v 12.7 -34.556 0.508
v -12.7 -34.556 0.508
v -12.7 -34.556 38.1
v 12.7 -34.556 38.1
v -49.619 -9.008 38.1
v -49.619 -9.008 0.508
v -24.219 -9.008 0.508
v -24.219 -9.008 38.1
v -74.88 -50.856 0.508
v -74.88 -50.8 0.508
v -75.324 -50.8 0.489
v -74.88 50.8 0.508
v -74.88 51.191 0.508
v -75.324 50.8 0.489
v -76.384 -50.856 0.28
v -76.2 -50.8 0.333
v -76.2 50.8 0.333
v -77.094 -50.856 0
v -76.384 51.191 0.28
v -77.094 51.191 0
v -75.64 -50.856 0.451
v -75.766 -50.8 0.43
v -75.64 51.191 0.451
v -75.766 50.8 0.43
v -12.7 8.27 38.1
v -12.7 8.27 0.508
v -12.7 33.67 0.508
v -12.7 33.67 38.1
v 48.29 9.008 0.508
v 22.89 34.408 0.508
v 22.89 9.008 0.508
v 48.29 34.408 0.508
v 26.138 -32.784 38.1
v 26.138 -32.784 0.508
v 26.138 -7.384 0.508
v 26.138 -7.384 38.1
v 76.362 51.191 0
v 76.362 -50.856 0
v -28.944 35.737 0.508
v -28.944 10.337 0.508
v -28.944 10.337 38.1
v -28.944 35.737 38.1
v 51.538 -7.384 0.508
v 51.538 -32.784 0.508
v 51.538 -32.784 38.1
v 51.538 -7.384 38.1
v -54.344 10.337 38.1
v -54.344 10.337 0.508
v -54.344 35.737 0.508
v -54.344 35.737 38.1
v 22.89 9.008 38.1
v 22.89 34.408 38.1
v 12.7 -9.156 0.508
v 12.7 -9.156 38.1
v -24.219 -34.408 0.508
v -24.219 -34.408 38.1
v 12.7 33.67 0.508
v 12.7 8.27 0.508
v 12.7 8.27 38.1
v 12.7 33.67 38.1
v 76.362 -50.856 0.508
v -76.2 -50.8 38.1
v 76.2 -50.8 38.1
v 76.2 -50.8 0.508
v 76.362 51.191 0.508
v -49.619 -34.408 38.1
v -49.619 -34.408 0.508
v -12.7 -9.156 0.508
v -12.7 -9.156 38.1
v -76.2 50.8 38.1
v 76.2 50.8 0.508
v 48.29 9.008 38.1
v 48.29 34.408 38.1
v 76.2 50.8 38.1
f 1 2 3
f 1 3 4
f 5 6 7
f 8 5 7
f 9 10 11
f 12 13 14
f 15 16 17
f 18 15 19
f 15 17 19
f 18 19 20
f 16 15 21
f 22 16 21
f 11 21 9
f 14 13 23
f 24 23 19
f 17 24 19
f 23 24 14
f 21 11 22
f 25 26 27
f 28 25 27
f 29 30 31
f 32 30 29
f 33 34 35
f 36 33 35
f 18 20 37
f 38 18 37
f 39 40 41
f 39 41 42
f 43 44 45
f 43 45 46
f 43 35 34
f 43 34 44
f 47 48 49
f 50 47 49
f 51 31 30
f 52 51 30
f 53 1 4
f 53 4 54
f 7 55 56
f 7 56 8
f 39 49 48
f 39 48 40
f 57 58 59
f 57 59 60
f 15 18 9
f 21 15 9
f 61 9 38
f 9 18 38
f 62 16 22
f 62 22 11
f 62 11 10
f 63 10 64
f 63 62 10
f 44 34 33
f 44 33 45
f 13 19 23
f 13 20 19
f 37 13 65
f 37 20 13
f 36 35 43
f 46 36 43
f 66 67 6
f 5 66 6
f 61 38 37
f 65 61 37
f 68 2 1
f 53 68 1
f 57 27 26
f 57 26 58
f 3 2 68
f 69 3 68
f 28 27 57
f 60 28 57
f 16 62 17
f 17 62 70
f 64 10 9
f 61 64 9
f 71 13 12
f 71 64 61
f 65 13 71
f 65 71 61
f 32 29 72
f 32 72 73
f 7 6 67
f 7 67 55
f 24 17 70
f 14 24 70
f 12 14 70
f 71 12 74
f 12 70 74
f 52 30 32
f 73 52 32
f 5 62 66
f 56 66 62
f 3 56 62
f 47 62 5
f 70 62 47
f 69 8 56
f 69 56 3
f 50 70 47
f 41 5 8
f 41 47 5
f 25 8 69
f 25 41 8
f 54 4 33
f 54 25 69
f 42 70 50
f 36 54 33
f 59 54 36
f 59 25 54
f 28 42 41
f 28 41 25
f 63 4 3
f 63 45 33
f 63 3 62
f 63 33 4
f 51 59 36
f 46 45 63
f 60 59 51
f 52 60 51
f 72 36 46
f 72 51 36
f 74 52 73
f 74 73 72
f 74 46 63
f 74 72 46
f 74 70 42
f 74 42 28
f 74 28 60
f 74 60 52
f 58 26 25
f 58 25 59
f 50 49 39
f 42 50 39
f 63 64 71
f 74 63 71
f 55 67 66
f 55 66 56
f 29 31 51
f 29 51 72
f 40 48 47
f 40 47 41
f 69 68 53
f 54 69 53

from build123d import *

# Parameters (mm, degrees)
F1_W         = 152.4
F1_H         = 101.6
F1_W_2       = 25.4
F1_H_2       = 25.4
F2_DEPTH     = 38.1
F3_W         = 153.4559056163
F3_H         = 102.0477414131
F3_W_2       = 152.4
F3_H_2       = 101.6
F4_DEPTH     = 0.508
F0_W         = 152.4
F0_H         = 101.6
F5_DEPTH     = 0.508
F6_T4_DEPTH  = 113.1193447297
F6_T9_DEPTH  = 113.1193447297
F6_T14_DEPTH = 113.1193447297


# Not quite as in the source:
# - a fillet or chamfer that OpenCascade refuses, or shapes differently, is made with other operations: its cross-section is extruded or revolved along the edge and cut away or added


with BuildPart() as f2:
    # F1 (on face) → F2 (new body)
    with BuildSketch(Plane.XY):
        Rectangle(F1_W, F1_H)
        with Locations((-36.918597445, -21.7081383014)):
            Rectangle(F1_W_2, F1_H_2, mode=Mode.SUBTRACT)
        with Locations((0, -21.855811876)):
            Rectangle(F1_W_2, F1_H_2, mode=Mode.SUBTRACT)
        with Locations((38.8383678732, -20.0837206056)):
            Rectangle(F1_W_2, F1_H_2, mode=Mode.SUBTRACT)
        with Locations((-41.6441853324, 23.0372088479)):
            Rectangle(F1_W_2, F1_H_2, mode=Mode.SUBTRACT)
        with Locations((0, 20.9697662408)):
            Rectangle(F1_W_2, F1_H_2, mode=Mode.SUBTRACT)
        with Locations((35.5895380648, 21.7081389993)):
            Rectangle(F1_W_2, F1_H_2, mode=Mode.SUBTRACT)
    extrude(amount=F2_DEPTH)

    # F3 (on face) → F4 (join)
    with BuildSketch(Plane.XY):
        with Locations((-0.3659911454, 0.1675821841)):
            Rectangle(F3_W, F3_H)
        Rectangle(F3_W_2, F3_H_2, mode=Mode.SUBTRACT)
    extrude(amount=F4_DEPTH)

    # F0 (on Top) → F5 (join)
    with BuildSketch(Plane.XY):
        Rectangle(F0_W, F0_H)
    extrude(amount=F5_DEPTH)

    # F6: fillet of radius 5.08 on 1 edges, made by hand


with BuildPart() as f6_tool2:
    # F6_s3 → F6_t4 (new body)
    with BuildSketch(Plane.XZ.offset(-56.7272545489)):
        with BuildLine():
            ThreePointArc((-74.8796232902, 0.508), (-76.0155458228, 0.3793715272), (-77.0939439535, 0))
            Line((-77.0939439535, 0), (-77.0939439535, 0.508))
            Line((-77.0939439535, 0.508), (-74.8796232902, 0.508))
        make_face()
    extrude(amount=F6_T4_DEPTH)

    split(bisect_by=Plane.XZ.offset(-50.8), keep=Keep.BOTTOM)


with BuildPart() as f2_1:
    add(f2.part)

    # F6_t1: cut F6_tool2
    add(f6_tool2.part, mode=Mode.SUBTRACT)


with BuildPart() as f6_tool7:
    # F6_s8 → F6_t9 (new body)
    with BuildSketch(Plane.XZ.offset(-56.7272545489)):
        with BuildLine():
            ThreePointArc((-74.8796232902, 0.508), (-76.0155458228, 0.3793715272), (-77.0939439535, 0))
            Line((-77.0939439535, 0), (-77.0939439535, 0.508))
            Line((-77.0939439535, 0.508), (-74.8796232902, 0.508))
        make_face()
    extrude(amount=F6_T9_DEPTH)

    split(bisect_by=Plane.YZ.offset(-76.2), keep=Keep.BOTTOM)


with BuildPart() as f2_2:
    add(f2_1.part)

    # F6_t6: cut F6_tool7
    add(f6_tool7.part, mode=Mode.SUBTRACT)


with BuildPart() as f6_tool12:
    # F6_s13 → F6_t14 (new body)
    with BuildSketch(Plane.XZ.offset(-56.7272545489)):
        with BuildLine():
            ThreePointArc((-74.8796232902, 0.508), (-76.0155458228, 0.3793715272), (-77.0939439535, 0))
            Line((-77.0939439535, 0), (-77.0939439535, 0.508))
            Line((-77.0939439535, 0.508), (-74.8796232902, 0.508))
        make_face()
    extrude(amount=F6_T14_DEPTH)

    split(bisect_by=Plane.XZ.offset(50.8), keep=Keep.TOP)


with BuildPart() as f2_3:
    add(f2_2.part)

    # F6_t11: cut F6_tool12
    add(f6_tool12.part, mode=Mode.SUBTRACT)


solid = f2_3.part
